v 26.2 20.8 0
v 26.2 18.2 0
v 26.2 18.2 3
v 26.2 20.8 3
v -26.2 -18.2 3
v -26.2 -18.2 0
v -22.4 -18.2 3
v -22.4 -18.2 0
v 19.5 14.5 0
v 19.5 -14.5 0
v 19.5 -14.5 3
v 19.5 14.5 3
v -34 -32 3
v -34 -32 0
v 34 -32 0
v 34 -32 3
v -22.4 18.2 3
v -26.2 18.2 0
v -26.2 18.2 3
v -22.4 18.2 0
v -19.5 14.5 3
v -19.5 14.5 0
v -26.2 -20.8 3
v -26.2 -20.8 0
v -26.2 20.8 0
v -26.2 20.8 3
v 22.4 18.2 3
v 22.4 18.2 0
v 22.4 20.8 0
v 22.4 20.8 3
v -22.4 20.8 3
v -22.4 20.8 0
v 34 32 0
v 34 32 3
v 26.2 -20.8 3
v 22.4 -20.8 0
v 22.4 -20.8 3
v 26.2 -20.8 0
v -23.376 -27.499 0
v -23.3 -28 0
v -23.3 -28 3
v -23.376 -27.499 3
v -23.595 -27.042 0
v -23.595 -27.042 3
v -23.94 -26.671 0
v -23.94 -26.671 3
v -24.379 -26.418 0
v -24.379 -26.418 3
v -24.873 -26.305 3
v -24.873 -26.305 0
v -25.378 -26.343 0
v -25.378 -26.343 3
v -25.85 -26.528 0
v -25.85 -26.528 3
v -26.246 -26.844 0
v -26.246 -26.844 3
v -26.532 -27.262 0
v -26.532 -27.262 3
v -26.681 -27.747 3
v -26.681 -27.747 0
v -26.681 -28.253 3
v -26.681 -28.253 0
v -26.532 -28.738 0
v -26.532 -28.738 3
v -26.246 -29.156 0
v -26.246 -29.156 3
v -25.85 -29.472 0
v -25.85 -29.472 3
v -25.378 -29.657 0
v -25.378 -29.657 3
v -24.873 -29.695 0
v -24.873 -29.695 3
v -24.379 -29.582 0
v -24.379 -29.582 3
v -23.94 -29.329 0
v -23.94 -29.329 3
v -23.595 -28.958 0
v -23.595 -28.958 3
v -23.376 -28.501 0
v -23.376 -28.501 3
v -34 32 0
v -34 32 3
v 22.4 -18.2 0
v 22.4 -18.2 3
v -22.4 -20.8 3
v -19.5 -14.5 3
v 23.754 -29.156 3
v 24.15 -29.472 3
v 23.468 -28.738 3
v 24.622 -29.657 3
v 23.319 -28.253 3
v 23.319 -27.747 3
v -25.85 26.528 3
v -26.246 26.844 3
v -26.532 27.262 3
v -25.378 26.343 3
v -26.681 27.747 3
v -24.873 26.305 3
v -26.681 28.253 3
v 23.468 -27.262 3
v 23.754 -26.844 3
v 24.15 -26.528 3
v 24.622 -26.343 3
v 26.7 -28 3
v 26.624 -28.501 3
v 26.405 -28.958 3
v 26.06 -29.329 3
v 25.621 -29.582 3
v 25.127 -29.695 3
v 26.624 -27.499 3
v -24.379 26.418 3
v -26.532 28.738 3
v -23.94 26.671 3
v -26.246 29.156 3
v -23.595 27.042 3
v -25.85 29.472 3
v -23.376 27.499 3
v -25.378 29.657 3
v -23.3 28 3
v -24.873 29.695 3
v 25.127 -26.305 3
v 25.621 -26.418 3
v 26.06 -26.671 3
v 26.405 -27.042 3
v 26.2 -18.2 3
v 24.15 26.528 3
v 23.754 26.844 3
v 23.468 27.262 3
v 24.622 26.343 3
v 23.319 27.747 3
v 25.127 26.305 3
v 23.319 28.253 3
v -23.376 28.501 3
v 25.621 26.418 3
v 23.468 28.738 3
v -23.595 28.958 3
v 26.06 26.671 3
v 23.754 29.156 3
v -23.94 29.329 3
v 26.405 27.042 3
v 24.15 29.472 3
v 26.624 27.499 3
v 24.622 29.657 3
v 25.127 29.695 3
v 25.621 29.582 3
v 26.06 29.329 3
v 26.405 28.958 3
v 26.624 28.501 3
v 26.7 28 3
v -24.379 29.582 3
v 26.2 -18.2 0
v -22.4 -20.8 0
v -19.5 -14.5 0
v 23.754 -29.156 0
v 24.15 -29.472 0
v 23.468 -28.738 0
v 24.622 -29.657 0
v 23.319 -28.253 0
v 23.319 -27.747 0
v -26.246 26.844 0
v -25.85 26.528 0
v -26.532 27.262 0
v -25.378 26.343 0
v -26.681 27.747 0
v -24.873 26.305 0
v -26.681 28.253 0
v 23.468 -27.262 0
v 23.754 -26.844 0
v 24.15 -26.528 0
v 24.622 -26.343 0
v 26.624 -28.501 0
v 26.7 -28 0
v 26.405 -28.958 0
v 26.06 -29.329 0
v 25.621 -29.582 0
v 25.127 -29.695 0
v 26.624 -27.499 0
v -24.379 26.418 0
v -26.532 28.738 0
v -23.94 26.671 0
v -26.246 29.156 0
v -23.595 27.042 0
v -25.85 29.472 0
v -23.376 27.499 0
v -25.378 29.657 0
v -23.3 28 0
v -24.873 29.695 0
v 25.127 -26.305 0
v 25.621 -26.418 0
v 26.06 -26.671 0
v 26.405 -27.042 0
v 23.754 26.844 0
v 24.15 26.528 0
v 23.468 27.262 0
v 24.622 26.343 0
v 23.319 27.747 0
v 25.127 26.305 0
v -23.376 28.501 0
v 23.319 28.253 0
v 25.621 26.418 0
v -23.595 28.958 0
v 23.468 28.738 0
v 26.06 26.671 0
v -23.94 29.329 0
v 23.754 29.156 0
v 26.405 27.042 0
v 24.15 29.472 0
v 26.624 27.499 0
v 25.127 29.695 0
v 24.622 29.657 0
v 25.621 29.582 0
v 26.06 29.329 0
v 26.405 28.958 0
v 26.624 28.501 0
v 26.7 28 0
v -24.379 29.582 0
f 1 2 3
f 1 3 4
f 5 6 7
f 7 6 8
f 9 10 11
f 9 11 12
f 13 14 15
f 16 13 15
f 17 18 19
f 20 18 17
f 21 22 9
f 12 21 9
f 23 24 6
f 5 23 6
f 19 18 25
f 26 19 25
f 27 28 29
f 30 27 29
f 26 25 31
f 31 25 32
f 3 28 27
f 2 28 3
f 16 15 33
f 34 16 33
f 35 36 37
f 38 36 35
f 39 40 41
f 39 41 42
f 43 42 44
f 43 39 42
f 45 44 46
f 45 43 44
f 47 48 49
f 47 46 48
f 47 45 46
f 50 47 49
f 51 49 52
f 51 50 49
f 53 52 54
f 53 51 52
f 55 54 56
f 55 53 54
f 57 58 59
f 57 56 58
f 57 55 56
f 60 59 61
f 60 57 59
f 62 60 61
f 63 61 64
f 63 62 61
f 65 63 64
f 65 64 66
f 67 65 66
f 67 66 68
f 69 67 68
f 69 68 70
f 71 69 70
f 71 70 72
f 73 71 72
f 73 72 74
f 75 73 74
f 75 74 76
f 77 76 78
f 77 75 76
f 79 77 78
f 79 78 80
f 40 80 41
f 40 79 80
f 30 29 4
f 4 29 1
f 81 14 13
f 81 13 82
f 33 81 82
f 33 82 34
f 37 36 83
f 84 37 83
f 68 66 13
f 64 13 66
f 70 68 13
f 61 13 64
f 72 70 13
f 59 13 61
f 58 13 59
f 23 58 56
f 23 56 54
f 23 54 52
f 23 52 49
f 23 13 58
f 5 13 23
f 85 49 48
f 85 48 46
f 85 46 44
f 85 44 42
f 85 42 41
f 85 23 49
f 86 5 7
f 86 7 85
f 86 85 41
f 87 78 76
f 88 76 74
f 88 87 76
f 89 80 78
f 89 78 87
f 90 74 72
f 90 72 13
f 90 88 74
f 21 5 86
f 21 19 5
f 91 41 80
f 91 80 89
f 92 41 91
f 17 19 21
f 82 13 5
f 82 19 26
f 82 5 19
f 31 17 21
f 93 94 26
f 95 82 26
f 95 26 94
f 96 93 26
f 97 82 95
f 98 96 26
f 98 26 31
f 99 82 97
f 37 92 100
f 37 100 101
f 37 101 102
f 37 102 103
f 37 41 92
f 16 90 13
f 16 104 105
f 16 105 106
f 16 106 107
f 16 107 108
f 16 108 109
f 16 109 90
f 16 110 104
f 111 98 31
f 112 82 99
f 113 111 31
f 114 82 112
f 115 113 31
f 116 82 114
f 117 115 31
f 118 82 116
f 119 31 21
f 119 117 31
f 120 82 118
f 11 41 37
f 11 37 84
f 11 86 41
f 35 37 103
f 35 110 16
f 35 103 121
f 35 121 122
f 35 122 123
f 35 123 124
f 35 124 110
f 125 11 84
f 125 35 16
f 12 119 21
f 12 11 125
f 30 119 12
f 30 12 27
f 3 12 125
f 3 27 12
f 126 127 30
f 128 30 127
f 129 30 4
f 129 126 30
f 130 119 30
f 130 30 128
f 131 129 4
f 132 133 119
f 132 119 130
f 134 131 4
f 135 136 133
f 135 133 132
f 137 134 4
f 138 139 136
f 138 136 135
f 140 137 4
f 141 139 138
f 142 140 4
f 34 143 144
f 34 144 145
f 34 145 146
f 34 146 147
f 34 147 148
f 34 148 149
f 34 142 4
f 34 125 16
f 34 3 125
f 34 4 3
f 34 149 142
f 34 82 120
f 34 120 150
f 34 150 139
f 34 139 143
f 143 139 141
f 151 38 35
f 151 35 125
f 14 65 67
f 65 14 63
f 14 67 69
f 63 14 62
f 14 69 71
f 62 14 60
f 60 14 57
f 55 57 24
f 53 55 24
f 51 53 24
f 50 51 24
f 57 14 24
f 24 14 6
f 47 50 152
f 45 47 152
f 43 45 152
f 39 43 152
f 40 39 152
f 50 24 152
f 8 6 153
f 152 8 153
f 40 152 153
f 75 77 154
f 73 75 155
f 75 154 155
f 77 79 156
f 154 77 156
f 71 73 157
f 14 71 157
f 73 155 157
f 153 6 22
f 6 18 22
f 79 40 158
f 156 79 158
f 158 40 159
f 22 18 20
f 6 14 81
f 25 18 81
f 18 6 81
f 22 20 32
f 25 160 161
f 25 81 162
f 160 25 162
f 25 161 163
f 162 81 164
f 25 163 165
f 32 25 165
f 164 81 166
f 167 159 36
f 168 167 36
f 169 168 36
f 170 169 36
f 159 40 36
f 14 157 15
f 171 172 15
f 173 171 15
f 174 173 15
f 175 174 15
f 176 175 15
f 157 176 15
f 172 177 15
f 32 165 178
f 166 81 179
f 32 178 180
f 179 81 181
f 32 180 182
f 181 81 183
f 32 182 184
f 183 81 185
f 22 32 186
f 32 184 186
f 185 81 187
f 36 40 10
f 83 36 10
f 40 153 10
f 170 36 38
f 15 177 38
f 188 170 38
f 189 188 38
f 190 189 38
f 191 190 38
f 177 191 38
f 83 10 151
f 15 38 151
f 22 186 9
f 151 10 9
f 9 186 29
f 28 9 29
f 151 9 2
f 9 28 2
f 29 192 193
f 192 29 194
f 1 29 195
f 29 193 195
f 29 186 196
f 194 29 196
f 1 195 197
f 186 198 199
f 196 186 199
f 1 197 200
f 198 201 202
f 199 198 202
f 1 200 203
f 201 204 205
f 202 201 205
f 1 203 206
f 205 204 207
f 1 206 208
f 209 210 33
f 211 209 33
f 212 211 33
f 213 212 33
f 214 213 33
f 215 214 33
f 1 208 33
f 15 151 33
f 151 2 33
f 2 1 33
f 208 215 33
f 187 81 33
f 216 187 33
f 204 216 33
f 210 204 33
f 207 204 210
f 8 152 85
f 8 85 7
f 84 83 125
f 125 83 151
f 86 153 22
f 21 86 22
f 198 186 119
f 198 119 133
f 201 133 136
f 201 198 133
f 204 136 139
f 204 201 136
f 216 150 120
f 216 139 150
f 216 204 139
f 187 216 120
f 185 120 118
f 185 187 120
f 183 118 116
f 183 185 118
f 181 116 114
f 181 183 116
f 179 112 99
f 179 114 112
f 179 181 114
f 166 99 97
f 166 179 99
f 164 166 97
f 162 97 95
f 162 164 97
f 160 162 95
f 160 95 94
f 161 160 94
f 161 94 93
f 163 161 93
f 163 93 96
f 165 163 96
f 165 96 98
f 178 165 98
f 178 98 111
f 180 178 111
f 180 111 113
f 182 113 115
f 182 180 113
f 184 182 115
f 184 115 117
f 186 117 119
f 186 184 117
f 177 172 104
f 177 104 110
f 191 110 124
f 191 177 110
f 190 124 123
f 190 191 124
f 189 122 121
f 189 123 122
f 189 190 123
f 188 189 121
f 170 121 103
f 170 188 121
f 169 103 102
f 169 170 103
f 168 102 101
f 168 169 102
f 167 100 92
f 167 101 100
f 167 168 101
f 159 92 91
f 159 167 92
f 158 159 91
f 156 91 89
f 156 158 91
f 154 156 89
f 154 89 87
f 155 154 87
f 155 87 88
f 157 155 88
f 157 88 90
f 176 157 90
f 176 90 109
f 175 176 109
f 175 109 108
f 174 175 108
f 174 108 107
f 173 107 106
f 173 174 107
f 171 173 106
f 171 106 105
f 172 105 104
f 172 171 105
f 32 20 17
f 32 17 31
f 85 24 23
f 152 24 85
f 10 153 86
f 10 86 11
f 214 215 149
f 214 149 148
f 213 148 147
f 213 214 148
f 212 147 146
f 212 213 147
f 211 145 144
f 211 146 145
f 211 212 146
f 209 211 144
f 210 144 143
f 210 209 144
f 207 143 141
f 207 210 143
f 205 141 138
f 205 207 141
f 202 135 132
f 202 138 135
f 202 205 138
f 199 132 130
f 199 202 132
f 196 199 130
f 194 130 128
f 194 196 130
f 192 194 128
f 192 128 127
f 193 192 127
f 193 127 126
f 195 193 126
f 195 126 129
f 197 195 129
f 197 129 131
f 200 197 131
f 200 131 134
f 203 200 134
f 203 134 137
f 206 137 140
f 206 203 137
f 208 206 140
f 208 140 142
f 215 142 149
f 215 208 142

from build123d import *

# Parameters (mm, degrees)
SKETCH_1_W                         = 68
SKETCH_1_H                         = 64
BOARD_MOUNT_BASE_DEPTH             = 3
SOLDER_AND_CONNECTOR_OPENING_START = -0.1
SKETCH_2_W                         = 39
SKETCH_2_H                         = 29
SOLDER_AND_CONNECTOR_OPENING_DEPTH = 3.2
PCB_M2_SLOTS_CENTRES48P6X39_START  = -0.1
SKETCH_3_W                         = 3.8
SKETCH_3_H                         = 2.6
PCB_M2_SLOTS_CENTRES48P6X39_DEPTH  = 3.2
DECK_ATTACHMENT_M3_START           = -0.1
SKETCH_4_R                         = 1.7
DECK_ATTACHMENT_M3_DEPTH           = 3.2


with BuildPart() as part:
    # 草图1 → Board_mount_base (new body)
    with BuildSketch(Plane.XY):
        Rectangle(SKETCH_1_W, SKETCH_1_H)
    extrude(amount=BOARD_MOUNT_BASE_DEPTH)

    # 草图2 → Solder_and_connector_opening (cut)
    with BuildSketch(Plane.XY.offset(SOLDER_AND_CONNECTOR_OPENING_START)):
        Rectangle(SKETCH_2_W, SKETCH_2_H)
    extrude(amount=SOLDER_AND_CONNECTOR_OPENING_DEPTH, mode=Mode.SUBTRACT)

    # 草图3 → PCB_M2_slots_centres48p6x39 (cut)
    with BuildSketch(Plane.XY.offset(PCB_M2_SLOTS_CENTRES48P6X39_START)):
        with Locations((-24.3, -19.5)):
            Rectangle(SKETCH_3_W, SKETCH_3_H)
        with Locations((-24.3, 19.5)):
            Rectangle(SKETCH_3_W, SKETCH_3_H)
        with Locations((24.3, -19.5)):
            Rectangle(SKETCH_3_W, SKETCH_3_H)
        with Locations((24.3, 19.5)):
            Rectangle(SKETCH_3_W, SKETCH_3_H)
    extrude(amount=PCB_M2_SLOTS_CENTRES48P6X39_DEPTH, mode=Mode.SUBTRACT)

    # 草图4 → Deck_attachment_M3 (cut)
    with BuildSketch(Plane.XY.offset(DECK_ATTACHMENT_M3_START)):
        with Locations((-25, -28)):
            Circle(SKETCH_4_R)
        with Locations((-25, 28)):
            Circle(SKETCH_4_R)
        with Locations((25, -28)):
            Circle(SKETCH_4_R)
        with Locations((25, 28)):
            Circle(SKETCH_4_R)
    extrude(amount=DECK_ATTACHMENT_M3_DEPTH, mode=Mode.SUBTRACT)


solid = part.part
